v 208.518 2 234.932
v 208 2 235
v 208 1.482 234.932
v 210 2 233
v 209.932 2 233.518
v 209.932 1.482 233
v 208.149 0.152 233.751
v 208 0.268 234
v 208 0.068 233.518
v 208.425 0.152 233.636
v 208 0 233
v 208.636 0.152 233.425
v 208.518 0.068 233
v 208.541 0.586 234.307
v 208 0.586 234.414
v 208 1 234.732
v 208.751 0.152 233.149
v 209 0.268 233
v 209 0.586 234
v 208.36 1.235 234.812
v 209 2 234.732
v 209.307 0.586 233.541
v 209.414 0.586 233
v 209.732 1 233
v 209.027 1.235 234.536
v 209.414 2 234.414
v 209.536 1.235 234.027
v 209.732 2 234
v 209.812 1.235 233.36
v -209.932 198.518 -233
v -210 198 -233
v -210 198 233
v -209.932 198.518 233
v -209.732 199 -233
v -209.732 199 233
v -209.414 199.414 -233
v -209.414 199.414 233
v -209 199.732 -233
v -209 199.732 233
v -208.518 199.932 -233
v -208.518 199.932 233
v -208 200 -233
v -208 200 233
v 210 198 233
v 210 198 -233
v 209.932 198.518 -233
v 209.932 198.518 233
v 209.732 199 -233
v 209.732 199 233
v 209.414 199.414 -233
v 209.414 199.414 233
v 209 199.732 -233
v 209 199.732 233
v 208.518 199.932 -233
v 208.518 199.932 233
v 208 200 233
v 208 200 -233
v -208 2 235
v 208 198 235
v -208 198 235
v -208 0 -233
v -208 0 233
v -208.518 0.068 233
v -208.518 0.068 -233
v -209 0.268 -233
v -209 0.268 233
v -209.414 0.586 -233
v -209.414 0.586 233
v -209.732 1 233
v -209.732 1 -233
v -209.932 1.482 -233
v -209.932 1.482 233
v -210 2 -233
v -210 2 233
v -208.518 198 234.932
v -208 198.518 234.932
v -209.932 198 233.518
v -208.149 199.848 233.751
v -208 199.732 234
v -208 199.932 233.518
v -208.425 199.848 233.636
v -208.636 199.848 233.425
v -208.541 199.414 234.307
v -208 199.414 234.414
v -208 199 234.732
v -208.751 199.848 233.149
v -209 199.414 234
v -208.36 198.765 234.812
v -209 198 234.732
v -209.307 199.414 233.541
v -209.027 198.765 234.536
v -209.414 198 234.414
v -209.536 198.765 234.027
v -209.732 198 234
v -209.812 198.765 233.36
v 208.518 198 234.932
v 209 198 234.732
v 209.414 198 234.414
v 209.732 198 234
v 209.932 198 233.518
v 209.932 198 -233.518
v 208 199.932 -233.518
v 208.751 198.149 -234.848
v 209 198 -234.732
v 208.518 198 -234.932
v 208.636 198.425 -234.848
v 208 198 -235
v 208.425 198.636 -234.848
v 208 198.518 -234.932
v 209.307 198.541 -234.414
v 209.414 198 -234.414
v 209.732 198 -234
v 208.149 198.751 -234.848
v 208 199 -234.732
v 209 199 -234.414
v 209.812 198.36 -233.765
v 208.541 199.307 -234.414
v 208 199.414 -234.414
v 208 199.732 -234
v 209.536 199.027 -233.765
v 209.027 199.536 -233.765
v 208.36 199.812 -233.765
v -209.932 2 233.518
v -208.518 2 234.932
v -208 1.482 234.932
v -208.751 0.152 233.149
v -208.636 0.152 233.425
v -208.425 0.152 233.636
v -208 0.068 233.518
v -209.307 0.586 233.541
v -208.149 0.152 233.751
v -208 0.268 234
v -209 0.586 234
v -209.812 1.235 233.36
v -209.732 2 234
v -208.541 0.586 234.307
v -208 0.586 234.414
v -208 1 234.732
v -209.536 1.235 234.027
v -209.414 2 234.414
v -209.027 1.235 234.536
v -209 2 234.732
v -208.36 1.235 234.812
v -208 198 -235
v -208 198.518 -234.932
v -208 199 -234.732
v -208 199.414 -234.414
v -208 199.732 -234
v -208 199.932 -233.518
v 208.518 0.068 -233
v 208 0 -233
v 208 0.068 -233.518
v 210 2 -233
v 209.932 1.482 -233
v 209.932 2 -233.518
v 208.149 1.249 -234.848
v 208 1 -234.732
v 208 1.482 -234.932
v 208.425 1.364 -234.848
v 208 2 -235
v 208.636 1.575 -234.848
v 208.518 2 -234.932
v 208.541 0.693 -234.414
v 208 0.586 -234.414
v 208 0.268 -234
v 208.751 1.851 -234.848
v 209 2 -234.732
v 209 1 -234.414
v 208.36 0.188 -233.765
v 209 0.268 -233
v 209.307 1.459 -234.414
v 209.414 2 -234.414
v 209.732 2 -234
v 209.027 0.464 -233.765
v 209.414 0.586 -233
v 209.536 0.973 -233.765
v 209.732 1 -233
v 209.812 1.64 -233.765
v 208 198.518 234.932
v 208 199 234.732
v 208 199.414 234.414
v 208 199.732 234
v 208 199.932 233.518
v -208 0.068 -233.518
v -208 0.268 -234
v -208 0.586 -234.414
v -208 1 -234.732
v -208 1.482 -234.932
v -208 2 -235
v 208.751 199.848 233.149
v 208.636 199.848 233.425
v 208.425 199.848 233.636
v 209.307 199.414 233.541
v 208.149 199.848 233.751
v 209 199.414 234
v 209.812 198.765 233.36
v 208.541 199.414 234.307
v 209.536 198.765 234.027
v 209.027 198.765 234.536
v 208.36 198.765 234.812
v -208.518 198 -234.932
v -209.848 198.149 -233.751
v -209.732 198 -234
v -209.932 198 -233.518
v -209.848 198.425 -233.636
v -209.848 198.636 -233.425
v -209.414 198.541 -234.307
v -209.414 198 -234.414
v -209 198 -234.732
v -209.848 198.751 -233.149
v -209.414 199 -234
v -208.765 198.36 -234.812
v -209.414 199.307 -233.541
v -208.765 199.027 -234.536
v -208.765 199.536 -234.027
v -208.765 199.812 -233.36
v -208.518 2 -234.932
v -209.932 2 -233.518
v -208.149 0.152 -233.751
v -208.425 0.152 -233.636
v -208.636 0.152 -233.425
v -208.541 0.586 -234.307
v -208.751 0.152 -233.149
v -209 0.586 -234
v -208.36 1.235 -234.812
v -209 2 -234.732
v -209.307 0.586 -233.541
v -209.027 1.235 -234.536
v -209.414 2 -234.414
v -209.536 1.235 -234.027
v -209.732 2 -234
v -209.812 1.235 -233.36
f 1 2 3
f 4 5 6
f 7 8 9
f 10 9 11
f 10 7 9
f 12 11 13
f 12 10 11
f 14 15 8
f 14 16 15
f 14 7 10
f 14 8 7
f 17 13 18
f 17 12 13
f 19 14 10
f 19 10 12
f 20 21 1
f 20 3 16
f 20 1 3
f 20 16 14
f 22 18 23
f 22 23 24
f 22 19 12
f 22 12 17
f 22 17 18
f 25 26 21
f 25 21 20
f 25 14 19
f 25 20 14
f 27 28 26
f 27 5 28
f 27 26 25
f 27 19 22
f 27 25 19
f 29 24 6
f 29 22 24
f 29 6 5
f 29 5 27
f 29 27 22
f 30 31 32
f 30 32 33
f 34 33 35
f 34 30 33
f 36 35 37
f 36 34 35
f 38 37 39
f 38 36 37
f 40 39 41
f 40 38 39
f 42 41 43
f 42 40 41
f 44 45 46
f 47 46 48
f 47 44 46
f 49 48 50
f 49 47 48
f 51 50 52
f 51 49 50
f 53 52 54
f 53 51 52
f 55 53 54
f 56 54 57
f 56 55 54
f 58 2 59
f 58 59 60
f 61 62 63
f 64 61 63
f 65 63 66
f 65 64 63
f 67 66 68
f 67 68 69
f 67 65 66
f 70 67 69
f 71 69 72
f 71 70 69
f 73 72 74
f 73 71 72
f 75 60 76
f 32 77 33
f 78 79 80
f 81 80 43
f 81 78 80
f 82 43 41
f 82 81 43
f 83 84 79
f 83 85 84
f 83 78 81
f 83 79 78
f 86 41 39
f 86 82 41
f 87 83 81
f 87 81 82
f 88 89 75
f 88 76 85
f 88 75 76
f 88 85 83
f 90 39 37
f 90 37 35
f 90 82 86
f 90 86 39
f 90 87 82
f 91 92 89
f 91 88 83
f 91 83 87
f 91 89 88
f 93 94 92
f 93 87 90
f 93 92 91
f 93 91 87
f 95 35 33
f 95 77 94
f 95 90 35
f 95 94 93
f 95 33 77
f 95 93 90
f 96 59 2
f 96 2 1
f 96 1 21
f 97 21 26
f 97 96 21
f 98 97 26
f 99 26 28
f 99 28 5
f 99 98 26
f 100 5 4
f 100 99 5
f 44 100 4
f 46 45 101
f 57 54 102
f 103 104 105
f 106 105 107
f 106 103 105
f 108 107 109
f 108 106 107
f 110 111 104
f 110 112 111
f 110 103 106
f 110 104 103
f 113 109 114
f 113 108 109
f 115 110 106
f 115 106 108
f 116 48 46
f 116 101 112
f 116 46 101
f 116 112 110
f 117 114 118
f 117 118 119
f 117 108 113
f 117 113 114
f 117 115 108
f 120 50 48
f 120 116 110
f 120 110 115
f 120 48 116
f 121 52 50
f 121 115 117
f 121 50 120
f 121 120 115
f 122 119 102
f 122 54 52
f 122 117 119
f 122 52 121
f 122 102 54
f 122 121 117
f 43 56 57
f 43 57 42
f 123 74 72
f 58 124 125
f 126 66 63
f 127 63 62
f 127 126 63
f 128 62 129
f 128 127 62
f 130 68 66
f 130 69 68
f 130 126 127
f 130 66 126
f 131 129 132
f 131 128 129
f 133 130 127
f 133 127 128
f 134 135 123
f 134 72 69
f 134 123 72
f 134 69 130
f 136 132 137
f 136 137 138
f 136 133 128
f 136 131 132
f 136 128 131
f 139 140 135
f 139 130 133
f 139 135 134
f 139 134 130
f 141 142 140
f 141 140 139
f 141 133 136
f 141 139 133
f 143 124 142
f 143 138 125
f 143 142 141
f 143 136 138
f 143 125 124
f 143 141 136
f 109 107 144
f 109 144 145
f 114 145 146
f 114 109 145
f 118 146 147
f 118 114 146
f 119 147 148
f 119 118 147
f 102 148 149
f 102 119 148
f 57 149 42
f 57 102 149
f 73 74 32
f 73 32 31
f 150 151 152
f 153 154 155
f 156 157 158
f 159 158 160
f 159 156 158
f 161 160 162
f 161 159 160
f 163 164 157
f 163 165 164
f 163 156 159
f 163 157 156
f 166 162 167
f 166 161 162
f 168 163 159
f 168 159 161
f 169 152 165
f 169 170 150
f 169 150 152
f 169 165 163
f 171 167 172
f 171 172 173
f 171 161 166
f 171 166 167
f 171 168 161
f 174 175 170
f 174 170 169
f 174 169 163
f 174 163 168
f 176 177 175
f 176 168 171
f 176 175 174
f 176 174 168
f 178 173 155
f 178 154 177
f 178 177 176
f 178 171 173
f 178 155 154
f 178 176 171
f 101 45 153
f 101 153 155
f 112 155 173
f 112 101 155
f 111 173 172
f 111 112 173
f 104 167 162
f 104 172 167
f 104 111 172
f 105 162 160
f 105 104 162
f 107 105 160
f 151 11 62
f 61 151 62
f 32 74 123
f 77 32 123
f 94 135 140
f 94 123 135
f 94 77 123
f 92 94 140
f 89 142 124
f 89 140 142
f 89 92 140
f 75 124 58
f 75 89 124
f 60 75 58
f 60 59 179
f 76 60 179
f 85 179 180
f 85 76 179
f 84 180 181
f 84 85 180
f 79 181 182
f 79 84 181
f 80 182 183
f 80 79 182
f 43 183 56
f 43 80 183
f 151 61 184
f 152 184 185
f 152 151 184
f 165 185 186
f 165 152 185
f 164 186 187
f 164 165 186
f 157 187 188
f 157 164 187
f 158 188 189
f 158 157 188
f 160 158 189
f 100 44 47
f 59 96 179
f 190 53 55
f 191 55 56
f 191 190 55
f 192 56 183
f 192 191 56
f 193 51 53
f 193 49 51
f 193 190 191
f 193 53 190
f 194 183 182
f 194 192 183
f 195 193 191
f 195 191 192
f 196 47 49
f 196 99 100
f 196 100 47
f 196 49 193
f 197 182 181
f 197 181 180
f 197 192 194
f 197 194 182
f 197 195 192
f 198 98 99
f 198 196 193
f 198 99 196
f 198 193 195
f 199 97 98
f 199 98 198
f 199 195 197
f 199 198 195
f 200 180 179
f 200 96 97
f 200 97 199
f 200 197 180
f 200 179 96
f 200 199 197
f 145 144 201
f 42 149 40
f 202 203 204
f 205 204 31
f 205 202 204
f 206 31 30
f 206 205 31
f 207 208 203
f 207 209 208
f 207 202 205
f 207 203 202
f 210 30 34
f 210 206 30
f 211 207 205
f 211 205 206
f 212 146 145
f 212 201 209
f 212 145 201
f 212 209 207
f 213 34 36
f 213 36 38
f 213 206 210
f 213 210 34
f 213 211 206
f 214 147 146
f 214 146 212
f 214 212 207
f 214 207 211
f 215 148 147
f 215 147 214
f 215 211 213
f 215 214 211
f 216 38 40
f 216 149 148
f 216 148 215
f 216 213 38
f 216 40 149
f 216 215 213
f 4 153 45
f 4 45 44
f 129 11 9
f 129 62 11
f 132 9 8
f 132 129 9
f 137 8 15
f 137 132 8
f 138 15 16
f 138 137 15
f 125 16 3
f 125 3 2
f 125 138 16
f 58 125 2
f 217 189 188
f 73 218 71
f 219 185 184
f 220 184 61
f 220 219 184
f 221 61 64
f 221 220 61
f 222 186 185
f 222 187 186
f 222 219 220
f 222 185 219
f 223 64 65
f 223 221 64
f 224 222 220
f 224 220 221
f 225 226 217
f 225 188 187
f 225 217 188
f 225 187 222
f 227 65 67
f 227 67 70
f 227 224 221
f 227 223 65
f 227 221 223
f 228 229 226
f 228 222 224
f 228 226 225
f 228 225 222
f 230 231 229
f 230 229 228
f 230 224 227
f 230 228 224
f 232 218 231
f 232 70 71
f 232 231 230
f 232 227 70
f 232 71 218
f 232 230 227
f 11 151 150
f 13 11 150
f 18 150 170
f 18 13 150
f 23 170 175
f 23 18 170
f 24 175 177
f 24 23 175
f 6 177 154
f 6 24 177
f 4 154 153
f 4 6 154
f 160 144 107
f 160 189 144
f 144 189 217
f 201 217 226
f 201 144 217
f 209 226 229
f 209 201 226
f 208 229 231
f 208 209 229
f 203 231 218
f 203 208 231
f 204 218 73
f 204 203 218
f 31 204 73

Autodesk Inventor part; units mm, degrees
ref_plane "YZ Plane" through (0, 0, 0) normal (1, 0, 0) x (0, 1, 0)
ref_plane "XZ Plane" through (0, 0, 0) normal (0, 1, 0) x (-1, 0, 0)
ref_plane "XY Plane" through (0, 0, 0) normal (0, 0, 1) x (1, 0, 0)
sketch "スケッチ1" plane through (0, 0, 0) normal (0, 1, 0) x (-1, 0, 0)
  line L0 (-210, 235) -> (210, 235)
  line L1 (210, 235) -> (210, -235)
  line L2 (210, -235) -> (-210, -235)
  line L3 (-210, -235) -> (-210, 235)
  line L4 (-210, 235) -> (210, -235) construction
  line L5 (210, 235) -> (-210, -235) construction
  point P0 (0, 0)
  dimension "d0" = 420
  dimension "d1" = 470
extrude "押し出し1" add sketch "スケッチ1" along normal blind 200
fillet "フィレット1" radius 2 12 edges at (-210, 100, 235) (210, 100, 235) (210, 200, 0) (0, 200, 235) (0, 0, 235) (210, 0, 0) (210, 100, -235) (0, 200, -235) (-210, 200, 0) (-210, 100, -235) (-210, 0, 0) (0, 0, -235)
properties part number "controller" material "ABS プラスチック"
